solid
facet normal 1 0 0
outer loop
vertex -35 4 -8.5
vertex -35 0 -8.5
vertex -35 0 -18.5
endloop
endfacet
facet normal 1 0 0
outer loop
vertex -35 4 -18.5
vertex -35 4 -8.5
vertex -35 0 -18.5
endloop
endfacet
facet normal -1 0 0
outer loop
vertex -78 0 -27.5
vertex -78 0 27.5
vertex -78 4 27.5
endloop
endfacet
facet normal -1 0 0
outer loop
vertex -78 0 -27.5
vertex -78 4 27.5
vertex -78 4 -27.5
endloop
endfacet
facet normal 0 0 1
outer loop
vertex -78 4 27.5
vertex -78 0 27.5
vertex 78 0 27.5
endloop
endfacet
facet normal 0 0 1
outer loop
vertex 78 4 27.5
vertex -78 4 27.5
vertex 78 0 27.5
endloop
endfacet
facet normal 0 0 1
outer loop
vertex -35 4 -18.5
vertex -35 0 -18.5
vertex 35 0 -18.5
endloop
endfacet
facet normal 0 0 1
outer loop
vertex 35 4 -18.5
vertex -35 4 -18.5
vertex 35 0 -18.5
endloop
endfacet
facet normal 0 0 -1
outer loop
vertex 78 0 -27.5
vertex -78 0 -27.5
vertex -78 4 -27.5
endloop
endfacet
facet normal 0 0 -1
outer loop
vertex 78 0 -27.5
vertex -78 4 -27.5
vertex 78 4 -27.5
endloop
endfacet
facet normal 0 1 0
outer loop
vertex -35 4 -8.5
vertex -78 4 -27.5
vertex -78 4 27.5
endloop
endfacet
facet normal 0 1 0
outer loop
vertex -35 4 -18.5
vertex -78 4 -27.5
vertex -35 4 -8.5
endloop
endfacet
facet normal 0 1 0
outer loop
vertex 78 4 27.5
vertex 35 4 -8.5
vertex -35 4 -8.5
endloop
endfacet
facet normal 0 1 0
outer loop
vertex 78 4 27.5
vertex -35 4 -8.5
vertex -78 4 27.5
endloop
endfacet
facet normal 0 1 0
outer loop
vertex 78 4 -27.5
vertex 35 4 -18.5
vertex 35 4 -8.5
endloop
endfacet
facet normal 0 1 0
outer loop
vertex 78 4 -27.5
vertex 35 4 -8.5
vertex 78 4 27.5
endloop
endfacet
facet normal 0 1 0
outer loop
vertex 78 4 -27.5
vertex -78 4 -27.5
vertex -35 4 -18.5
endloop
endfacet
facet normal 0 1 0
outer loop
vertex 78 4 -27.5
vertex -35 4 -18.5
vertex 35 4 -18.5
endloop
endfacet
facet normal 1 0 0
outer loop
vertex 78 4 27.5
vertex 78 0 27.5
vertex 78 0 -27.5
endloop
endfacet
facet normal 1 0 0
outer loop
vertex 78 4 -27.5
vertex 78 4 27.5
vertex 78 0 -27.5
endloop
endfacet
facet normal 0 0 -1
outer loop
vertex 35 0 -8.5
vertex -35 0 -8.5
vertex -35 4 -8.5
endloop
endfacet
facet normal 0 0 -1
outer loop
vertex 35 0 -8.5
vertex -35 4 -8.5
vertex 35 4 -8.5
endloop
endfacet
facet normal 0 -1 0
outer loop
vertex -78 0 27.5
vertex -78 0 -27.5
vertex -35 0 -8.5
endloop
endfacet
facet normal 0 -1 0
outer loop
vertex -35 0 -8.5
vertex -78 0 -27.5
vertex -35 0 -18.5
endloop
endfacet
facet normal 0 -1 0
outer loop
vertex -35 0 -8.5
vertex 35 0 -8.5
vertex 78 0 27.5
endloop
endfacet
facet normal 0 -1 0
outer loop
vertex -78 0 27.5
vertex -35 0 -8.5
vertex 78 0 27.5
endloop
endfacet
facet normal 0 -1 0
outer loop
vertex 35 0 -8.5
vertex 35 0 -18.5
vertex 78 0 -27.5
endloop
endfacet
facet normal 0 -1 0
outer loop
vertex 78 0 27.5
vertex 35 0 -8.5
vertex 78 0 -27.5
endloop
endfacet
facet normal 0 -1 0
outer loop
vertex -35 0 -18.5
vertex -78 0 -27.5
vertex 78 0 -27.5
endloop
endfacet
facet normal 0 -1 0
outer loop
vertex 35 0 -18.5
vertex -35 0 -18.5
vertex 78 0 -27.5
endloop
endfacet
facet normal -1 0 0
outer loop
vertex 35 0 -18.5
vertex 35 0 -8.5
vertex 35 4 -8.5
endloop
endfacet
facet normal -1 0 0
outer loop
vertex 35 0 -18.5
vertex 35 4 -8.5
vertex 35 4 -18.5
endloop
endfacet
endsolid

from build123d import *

# Parameters (mm, degrees)
SKETCH1_W           = 156
SKETCH1_H           = 55
SKETCH1_W_2         = 70
SKETCH1_H_2         = 10
BOSS_EXTRUDE1_DEPTH = 4
SKETCH1_2_W         = 156
SKETCH1_2_H         = 55
SKETCH1_2_W_2       = 70
SKETCH1_2_H_2       = 10
BOSS_EXTRUDE2_DEPTH = 4


with BuildPart() as part:
    # Sketch1 → Boss-Extrude1 (new body)
    with BuildSketch(Plane(origin=(0, 0, 0), x_dir=(1, 0, 0), z_dir=(0, 1, 0))):
        Rectangle(SKETCH1_W, SKETCH1_H)
        with Locations((0, 13.5)):
            Rectangle(SKETCH1_W_2, SKETCH1_H_2, mode=Mode.SUBTRACT)
    extrude(amount=BOSS_EXTRUDE1_DEPTH)

    # Sketch1<2> → Boss-Extrude2 (add)
    with BuildSketch(Plane(origin=(0, 0, 0), x_dir=(1, 0, 0), z_dir=(0, 1, 0))):
        Rectangle(SKETCH1_2_W, SKETCH1_2_H)
        with Locations((0, 13.5)):
            Rectangle(SKETCH1_2_W_2, SKETCH1_2_H_2, mode=Mode.SUBTRACT)
    extrude(amount=BOSS_EXTRUDE2_DEPTH)


solid = part.part
